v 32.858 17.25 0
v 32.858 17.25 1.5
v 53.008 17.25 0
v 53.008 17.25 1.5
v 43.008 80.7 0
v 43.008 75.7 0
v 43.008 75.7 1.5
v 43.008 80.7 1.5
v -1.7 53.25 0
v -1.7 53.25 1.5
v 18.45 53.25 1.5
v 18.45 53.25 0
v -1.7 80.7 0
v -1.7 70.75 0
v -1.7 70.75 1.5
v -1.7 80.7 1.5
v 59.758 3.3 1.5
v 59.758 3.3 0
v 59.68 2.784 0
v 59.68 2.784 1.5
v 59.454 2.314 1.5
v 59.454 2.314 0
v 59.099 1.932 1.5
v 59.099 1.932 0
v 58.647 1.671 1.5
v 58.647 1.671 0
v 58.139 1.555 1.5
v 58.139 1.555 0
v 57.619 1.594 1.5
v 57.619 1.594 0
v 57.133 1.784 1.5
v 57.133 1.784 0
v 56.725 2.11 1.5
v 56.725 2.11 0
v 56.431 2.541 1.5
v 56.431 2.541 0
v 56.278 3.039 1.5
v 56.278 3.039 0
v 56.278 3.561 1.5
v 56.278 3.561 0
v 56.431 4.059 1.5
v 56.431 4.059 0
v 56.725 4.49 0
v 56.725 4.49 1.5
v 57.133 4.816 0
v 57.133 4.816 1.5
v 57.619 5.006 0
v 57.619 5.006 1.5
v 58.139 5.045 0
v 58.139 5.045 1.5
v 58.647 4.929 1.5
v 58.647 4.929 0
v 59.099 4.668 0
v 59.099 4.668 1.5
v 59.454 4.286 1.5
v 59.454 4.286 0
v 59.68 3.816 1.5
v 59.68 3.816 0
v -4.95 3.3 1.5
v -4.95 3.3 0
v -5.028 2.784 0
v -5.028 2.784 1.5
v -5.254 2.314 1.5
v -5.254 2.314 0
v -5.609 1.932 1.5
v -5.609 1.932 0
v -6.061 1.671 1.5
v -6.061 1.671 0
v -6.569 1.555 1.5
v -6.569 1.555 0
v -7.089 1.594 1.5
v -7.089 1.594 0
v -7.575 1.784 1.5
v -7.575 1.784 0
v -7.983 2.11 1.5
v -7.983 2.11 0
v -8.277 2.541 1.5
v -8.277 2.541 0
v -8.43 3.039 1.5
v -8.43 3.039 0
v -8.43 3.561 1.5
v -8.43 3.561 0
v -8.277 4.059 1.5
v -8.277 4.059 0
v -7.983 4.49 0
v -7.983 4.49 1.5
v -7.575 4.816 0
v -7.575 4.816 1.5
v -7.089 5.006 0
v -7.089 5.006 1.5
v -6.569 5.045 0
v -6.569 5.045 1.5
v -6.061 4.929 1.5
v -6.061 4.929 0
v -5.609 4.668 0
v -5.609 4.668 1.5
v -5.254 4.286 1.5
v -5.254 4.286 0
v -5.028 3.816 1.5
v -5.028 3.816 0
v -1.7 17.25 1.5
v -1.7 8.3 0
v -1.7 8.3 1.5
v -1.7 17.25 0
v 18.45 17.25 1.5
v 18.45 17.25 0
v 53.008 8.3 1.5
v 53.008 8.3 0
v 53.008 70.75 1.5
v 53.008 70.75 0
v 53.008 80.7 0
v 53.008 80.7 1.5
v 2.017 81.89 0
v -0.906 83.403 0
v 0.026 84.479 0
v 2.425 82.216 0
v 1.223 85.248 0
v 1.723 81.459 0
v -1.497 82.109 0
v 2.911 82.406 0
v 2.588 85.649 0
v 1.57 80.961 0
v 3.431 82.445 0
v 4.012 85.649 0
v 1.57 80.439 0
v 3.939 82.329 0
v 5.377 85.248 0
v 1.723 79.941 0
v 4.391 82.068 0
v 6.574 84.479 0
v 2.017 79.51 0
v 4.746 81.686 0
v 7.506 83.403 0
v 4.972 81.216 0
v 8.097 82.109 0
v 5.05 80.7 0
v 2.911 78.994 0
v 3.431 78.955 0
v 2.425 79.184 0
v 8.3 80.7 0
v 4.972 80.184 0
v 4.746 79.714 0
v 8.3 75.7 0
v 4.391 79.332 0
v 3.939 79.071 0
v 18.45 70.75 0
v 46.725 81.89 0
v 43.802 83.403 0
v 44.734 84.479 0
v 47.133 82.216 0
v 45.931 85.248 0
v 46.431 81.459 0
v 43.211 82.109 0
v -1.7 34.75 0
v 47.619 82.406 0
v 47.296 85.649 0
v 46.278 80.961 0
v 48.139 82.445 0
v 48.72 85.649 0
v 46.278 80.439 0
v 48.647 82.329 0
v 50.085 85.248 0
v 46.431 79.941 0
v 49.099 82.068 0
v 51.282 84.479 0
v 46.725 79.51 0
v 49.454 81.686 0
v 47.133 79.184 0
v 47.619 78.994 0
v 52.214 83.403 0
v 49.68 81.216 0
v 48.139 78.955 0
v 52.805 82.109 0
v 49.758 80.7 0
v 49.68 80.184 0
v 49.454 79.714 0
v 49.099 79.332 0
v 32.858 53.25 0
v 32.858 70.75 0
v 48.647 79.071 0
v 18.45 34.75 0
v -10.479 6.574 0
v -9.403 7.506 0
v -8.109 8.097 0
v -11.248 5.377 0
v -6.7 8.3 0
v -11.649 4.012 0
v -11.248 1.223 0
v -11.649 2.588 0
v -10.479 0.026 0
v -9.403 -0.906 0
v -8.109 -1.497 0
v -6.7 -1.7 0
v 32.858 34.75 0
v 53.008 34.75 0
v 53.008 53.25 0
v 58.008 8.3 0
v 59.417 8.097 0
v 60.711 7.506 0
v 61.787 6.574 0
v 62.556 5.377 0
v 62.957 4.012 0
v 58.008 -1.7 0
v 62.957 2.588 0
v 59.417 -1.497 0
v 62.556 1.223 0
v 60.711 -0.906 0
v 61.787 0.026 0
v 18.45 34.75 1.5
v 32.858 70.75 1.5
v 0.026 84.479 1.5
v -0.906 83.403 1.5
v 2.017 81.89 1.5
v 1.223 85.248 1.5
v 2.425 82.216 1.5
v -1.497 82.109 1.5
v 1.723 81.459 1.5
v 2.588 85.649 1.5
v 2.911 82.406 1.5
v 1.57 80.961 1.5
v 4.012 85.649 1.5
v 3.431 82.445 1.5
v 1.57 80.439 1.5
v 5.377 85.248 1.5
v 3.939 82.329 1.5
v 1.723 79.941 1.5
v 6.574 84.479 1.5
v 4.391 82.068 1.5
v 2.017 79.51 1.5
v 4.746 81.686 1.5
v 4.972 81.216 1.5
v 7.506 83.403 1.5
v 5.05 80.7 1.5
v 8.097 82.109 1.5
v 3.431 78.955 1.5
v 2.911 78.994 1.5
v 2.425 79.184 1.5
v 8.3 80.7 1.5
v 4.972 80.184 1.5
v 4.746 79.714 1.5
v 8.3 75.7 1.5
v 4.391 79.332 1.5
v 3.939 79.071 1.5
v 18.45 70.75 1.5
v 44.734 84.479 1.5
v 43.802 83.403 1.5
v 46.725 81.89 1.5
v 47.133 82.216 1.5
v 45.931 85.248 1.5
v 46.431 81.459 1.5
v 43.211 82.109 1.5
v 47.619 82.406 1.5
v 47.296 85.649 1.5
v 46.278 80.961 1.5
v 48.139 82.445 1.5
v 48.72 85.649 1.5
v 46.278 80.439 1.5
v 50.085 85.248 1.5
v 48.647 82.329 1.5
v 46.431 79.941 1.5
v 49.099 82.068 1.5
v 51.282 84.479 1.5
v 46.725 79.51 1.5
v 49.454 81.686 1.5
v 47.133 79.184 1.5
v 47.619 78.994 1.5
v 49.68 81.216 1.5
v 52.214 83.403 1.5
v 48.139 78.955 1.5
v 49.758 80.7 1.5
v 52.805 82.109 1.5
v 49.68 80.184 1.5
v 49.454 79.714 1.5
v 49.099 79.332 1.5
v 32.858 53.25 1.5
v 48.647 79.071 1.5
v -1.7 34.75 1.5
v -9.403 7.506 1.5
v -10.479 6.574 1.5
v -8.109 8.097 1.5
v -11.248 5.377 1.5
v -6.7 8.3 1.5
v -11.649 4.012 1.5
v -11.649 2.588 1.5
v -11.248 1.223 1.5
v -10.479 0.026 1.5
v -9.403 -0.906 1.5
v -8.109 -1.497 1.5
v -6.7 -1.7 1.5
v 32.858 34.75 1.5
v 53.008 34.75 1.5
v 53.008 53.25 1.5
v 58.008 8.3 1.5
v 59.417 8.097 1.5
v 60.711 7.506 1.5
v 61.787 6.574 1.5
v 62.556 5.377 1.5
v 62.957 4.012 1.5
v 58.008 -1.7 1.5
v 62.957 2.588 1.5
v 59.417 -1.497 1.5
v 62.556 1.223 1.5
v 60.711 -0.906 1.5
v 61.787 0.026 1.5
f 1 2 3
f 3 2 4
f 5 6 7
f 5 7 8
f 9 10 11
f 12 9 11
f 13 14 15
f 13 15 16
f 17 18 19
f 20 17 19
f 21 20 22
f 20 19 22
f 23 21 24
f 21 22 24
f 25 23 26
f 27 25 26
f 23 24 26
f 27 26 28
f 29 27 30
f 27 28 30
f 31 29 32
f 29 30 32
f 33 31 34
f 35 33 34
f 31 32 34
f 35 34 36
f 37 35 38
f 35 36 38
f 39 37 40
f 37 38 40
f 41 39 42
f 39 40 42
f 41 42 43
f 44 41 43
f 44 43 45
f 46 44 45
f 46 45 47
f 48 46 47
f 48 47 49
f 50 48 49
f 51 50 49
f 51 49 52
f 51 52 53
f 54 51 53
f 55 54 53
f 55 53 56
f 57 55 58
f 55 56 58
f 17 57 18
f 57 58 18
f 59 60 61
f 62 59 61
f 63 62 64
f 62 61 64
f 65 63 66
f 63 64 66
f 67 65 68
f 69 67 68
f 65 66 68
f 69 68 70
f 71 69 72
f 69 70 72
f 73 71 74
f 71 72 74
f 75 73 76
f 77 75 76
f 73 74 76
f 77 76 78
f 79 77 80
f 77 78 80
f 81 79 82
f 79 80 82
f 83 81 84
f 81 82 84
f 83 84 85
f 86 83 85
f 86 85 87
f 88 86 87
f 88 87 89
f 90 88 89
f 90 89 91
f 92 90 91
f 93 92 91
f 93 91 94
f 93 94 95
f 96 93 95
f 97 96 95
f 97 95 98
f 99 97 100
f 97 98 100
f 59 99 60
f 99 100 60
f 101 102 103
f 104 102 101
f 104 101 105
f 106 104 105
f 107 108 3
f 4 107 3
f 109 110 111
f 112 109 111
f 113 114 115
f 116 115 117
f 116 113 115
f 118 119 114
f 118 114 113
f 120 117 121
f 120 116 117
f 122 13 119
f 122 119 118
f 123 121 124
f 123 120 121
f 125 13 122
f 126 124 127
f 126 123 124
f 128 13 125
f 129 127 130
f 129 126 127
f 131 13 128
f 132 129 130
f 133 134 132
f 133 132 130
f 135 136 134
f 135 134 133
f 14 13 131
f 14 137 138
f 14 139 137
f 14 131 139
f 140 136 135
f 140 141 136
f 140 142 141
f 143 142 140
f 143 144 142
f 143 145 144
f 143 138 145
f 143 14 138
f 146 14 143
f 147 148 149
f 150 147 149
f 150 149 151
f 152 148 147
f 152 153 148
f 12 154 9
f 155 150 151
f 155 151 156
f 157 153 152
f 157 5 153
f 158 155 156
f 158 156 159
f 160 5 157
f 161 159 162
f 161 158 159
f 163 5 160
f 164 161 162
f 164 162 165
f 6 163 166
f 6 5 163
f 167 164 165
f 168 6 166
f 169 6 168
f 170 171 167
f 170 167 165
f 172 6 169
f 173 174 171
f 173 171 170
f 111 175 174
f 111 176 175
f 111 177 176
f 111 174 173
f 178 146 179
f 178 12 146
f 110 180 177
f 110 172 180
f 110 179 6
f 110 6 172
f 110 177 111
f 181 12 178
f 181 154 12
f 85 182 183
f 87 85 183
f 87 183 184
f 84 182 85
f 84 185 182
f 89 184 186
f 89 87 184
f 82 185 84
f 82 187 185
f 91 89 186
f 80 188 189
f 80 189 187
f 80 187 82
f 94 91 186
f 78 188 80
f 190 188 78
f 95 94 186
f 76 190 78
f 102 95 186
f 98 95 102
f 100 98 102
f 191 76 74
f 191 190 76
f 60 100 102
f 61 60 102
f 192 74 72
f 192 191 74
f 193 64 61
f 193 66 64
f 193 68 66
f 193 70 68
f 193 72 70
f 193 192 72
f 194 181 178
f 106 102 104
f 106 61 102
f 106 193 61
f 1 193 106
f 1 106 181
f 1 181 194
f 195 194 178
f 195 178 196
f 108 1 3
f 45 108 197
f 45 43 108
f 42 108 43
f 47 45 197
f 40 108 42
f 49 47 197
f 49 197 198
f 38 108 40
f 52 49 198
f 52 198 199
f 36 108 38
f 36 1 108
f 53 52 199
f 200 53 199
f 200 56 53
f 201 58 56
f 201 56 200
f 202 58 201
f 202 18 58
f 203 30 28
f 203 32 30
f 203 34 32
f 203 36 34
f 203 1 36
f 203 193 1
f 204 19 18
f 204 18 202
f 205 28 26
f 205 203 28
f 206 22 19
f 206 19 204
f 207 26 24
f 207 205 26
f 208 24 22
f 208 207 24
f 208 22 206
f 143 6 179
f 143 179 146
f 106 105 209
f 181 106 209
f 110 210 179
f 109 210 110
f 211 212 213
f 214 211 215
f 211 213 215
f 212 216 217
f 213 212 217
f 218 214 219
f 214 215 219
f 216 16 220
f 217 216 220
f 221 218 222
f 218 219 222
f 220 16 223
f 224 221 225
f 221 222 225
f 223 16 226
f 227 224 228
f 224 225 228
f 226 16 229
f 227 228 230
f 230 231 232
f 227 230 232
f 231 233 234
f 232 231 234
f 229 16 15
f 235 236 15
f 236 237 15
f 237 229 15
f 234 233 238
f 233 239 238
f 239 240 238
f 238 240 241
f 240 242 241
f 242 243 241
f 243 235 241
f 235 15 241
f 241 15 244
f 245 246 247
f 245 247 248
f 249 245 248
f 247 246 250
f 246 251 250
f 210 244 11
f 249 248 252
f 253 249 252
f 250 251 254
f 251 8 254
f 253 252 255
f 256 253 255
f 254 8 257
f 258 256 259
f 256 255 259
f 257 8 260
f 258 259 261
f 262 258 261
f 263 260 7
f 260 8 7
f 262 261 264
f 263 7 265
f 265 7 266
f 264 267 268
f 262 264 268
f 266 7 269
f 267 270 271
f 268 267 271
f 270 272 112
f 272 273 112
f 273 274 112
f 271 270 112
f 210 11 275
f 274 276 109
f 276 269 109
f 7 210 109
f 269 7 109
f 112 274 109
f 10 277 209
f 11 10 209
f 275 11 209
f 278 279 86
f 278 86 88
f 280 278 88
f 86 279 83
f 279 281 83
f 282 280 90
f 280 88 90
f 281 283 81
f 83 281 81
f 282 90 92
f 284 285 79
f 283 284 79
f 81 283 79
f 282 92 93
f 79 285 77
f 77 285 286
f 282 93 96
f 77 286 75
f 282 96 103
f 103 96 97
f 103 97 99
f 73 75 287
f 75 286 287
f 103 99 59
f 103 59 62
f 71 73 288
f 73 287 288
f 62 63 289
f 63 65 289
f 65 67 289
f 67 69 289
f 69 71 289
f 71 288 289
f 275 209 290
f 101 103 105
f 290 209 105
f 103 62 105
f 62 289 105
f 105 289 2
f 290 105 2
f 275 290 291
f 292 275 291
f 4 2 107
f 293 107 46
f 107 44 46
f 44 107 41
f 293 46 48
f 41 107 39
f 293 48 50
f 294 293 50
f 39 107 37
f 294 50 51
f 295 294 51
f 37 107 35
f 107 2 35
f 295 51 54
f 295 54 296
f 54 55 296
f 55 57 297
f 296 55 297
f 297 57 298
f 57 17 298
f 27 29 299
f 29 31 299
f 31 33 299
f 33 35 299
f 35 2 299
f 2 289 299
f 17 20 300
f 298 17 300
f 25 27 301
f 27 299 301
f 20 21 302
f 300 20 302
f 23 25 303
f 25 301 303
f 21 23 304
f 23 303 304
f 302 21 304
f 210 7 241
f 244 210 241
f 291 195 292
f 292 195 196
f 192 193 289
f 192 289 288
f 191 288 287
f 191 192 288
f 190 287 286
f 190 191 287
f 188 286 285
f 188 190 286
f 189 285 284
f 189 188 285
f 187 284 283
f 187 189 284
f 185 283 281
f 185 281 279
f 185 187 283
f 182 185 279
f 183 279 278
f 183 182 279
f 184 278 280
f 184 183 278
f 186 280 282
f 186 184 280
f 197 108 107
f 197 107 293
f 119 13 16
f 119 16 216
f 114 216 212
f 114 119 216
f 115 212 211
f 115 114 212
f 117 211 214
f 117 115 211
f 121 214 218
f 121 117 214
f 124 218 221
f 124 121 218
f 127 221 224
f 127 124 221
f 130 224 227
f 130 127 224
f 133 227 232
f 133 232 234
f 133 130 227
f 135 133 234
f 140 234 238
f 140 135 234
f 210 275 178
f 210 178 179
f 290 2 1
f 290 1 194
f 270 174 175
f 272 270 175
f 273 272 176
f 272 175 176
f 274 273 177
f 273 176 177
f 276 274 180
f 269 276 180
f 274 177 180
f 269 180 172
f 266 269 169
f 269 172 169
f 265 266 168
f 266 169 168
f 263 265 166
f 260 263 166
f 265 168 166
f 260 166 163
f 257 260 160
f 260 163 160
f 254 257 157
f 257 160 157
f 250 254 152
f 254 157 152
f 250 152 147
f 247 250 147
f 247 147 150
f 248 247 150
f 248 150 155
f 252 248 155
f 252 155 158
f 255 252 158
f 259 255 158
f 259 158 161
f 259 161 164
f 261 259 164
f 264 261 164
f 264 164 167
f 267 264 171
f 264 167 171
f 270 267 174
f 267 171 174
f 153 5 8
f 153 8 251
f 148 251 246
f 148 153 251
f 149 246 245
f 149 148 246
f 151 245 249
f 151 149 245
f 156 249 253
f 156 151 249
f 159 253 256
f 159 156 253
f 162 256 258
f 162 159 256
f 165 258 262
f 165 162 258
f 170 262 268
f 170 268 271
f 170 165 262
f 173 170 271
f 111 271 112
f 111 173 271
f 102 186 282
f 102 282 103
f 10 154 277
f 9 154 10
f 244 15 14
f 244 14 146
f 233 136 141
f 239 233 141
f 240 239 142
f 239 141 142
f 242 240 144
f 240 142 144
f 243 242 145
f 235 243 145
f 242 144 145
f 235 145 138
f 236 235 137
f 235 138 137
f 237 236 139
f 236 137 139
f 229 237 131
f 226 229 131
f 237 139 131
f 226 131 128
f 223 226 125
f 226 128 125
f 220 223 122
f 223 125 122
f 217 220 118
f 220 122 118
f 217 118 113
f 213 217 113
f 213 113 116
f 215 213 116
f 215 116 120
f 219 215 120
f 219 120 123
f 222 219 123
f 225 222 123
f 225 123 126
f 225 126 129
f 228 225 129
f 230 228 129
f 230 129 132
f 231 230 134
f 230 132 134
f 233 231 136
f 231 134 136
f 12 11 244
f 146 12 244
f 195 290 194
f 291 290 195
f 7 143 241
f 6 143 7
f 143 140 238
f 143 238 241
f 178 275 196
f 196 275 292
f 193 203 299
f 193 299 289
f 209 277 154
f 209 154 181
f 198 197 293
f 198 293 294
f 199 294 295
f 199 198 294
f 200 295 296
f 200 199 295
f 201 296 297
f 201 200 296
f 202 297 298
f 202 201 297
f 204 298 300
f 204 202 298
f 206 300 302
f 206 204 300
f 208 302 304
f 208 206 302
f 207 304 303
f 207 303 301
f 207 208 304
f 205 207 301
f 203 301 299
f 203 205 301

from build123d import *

# Parameters (mm, degrees)
F1_W     = 54.708
F1_H     = 77.4
F2_DEPTH = 1.5
F3_R     = 1.75
F4_DEPTH = 1.5
F5_W     = 20.2
F5_H     = 17.5
F6_DEPTH = 1.501


with BuildPart() as f2:
    # F1 (on face) → F2 (new body)
    with BuildSketch(Plane.XY):
        with Locations((25.654, 37)):
            Rectangle(F1_W, F1_H)
    extrude(amount=F2_DEPTH)

    # F3 (on face) → F4 (join)
    with BuildSketch(Plane(origin=(0, 0, 0), x_dir=(1, 0, 0), z_dir=(0, 0, -1))):
        with BuildLine():
            Line((-1.7, 1.7), (-6.7, 1.7))
            ThreePointArc((-6.7, 1.7), (-11.7, -3.3), (-6.7, -8.3))
            Line((-6.7, -8.3), (-1.7, -8.3))
            Line((-1.7, -8.3), (-1.7, 1.7))
        make_face()
        with Locations((-6.7, -3.3)):
            Circle(F3_R, mode=Mode.SUBTRACT)
        with BuildLine():
            Line((-1.7, -75.7), (-1.7, -80.7))
            ThreePointArc((-1.7, -80.7), (3.3, -85.7), (8.3, -80.7))
            Line((8.3, -80.7), (8.3, -75.7))
            Line((8.3, -75.7), (-1.7, -75.7))
        make_face()
        with Locations((3.3, -80.7)):
            Circle(F3_R, mode=Mode.SUBTRACT)
        with BuildLine():
            Line((53.008, -8.3), (58.008, -8.3))
            ThreePointArc((58.008, -8.3), (63.008, -3.3), (58.008, 1.7))
            Line((58.008, 1.7), (53.008, 1.7))
            Line((53.008, 1.7), (53.008, -8.3))
        make_face()
        with Locations((58.008, -3.3)):
            Circle(F3_R, mode=Mode.SUBTRACT)
        with BuildLine():
            Line((43.008, -75.7), (43.008, -80.7))
            ThreePointArc((43.008, -80.7), (48.008, -85.7), (53.008, -80.7))
            Line((53.008, -80.7), (53.008, -75.7))
            Line((53.008, -75.7), (43.008, -75.7))
        make_face()
        with Locations((48.008, -80.7)):
            Circle(F3_R, mode=Mode.SUBTRACT)
    extrude(amount=-F4_DEPTH)

    # F5 (on face) → F6 (cut, through all)
    with BuildSketch(Plane.XY.offset(1.5)):
        with Locations((8.35, 26)):
            Rectangle(F5_W, F5_H)
        with Locations((42.958, 26)):
            Rectangle(F5_W, F5_H)
        with Locations((8.35, 62)):
            Rectangle(F5_W, F5_H)
        with Locations((42.958, 62)):
            Rectangle(F5_W, F5_H)
    extrude(amount=-F6_DEPTH, mode=Mode.SUBTRACT)


solid = f2.part
